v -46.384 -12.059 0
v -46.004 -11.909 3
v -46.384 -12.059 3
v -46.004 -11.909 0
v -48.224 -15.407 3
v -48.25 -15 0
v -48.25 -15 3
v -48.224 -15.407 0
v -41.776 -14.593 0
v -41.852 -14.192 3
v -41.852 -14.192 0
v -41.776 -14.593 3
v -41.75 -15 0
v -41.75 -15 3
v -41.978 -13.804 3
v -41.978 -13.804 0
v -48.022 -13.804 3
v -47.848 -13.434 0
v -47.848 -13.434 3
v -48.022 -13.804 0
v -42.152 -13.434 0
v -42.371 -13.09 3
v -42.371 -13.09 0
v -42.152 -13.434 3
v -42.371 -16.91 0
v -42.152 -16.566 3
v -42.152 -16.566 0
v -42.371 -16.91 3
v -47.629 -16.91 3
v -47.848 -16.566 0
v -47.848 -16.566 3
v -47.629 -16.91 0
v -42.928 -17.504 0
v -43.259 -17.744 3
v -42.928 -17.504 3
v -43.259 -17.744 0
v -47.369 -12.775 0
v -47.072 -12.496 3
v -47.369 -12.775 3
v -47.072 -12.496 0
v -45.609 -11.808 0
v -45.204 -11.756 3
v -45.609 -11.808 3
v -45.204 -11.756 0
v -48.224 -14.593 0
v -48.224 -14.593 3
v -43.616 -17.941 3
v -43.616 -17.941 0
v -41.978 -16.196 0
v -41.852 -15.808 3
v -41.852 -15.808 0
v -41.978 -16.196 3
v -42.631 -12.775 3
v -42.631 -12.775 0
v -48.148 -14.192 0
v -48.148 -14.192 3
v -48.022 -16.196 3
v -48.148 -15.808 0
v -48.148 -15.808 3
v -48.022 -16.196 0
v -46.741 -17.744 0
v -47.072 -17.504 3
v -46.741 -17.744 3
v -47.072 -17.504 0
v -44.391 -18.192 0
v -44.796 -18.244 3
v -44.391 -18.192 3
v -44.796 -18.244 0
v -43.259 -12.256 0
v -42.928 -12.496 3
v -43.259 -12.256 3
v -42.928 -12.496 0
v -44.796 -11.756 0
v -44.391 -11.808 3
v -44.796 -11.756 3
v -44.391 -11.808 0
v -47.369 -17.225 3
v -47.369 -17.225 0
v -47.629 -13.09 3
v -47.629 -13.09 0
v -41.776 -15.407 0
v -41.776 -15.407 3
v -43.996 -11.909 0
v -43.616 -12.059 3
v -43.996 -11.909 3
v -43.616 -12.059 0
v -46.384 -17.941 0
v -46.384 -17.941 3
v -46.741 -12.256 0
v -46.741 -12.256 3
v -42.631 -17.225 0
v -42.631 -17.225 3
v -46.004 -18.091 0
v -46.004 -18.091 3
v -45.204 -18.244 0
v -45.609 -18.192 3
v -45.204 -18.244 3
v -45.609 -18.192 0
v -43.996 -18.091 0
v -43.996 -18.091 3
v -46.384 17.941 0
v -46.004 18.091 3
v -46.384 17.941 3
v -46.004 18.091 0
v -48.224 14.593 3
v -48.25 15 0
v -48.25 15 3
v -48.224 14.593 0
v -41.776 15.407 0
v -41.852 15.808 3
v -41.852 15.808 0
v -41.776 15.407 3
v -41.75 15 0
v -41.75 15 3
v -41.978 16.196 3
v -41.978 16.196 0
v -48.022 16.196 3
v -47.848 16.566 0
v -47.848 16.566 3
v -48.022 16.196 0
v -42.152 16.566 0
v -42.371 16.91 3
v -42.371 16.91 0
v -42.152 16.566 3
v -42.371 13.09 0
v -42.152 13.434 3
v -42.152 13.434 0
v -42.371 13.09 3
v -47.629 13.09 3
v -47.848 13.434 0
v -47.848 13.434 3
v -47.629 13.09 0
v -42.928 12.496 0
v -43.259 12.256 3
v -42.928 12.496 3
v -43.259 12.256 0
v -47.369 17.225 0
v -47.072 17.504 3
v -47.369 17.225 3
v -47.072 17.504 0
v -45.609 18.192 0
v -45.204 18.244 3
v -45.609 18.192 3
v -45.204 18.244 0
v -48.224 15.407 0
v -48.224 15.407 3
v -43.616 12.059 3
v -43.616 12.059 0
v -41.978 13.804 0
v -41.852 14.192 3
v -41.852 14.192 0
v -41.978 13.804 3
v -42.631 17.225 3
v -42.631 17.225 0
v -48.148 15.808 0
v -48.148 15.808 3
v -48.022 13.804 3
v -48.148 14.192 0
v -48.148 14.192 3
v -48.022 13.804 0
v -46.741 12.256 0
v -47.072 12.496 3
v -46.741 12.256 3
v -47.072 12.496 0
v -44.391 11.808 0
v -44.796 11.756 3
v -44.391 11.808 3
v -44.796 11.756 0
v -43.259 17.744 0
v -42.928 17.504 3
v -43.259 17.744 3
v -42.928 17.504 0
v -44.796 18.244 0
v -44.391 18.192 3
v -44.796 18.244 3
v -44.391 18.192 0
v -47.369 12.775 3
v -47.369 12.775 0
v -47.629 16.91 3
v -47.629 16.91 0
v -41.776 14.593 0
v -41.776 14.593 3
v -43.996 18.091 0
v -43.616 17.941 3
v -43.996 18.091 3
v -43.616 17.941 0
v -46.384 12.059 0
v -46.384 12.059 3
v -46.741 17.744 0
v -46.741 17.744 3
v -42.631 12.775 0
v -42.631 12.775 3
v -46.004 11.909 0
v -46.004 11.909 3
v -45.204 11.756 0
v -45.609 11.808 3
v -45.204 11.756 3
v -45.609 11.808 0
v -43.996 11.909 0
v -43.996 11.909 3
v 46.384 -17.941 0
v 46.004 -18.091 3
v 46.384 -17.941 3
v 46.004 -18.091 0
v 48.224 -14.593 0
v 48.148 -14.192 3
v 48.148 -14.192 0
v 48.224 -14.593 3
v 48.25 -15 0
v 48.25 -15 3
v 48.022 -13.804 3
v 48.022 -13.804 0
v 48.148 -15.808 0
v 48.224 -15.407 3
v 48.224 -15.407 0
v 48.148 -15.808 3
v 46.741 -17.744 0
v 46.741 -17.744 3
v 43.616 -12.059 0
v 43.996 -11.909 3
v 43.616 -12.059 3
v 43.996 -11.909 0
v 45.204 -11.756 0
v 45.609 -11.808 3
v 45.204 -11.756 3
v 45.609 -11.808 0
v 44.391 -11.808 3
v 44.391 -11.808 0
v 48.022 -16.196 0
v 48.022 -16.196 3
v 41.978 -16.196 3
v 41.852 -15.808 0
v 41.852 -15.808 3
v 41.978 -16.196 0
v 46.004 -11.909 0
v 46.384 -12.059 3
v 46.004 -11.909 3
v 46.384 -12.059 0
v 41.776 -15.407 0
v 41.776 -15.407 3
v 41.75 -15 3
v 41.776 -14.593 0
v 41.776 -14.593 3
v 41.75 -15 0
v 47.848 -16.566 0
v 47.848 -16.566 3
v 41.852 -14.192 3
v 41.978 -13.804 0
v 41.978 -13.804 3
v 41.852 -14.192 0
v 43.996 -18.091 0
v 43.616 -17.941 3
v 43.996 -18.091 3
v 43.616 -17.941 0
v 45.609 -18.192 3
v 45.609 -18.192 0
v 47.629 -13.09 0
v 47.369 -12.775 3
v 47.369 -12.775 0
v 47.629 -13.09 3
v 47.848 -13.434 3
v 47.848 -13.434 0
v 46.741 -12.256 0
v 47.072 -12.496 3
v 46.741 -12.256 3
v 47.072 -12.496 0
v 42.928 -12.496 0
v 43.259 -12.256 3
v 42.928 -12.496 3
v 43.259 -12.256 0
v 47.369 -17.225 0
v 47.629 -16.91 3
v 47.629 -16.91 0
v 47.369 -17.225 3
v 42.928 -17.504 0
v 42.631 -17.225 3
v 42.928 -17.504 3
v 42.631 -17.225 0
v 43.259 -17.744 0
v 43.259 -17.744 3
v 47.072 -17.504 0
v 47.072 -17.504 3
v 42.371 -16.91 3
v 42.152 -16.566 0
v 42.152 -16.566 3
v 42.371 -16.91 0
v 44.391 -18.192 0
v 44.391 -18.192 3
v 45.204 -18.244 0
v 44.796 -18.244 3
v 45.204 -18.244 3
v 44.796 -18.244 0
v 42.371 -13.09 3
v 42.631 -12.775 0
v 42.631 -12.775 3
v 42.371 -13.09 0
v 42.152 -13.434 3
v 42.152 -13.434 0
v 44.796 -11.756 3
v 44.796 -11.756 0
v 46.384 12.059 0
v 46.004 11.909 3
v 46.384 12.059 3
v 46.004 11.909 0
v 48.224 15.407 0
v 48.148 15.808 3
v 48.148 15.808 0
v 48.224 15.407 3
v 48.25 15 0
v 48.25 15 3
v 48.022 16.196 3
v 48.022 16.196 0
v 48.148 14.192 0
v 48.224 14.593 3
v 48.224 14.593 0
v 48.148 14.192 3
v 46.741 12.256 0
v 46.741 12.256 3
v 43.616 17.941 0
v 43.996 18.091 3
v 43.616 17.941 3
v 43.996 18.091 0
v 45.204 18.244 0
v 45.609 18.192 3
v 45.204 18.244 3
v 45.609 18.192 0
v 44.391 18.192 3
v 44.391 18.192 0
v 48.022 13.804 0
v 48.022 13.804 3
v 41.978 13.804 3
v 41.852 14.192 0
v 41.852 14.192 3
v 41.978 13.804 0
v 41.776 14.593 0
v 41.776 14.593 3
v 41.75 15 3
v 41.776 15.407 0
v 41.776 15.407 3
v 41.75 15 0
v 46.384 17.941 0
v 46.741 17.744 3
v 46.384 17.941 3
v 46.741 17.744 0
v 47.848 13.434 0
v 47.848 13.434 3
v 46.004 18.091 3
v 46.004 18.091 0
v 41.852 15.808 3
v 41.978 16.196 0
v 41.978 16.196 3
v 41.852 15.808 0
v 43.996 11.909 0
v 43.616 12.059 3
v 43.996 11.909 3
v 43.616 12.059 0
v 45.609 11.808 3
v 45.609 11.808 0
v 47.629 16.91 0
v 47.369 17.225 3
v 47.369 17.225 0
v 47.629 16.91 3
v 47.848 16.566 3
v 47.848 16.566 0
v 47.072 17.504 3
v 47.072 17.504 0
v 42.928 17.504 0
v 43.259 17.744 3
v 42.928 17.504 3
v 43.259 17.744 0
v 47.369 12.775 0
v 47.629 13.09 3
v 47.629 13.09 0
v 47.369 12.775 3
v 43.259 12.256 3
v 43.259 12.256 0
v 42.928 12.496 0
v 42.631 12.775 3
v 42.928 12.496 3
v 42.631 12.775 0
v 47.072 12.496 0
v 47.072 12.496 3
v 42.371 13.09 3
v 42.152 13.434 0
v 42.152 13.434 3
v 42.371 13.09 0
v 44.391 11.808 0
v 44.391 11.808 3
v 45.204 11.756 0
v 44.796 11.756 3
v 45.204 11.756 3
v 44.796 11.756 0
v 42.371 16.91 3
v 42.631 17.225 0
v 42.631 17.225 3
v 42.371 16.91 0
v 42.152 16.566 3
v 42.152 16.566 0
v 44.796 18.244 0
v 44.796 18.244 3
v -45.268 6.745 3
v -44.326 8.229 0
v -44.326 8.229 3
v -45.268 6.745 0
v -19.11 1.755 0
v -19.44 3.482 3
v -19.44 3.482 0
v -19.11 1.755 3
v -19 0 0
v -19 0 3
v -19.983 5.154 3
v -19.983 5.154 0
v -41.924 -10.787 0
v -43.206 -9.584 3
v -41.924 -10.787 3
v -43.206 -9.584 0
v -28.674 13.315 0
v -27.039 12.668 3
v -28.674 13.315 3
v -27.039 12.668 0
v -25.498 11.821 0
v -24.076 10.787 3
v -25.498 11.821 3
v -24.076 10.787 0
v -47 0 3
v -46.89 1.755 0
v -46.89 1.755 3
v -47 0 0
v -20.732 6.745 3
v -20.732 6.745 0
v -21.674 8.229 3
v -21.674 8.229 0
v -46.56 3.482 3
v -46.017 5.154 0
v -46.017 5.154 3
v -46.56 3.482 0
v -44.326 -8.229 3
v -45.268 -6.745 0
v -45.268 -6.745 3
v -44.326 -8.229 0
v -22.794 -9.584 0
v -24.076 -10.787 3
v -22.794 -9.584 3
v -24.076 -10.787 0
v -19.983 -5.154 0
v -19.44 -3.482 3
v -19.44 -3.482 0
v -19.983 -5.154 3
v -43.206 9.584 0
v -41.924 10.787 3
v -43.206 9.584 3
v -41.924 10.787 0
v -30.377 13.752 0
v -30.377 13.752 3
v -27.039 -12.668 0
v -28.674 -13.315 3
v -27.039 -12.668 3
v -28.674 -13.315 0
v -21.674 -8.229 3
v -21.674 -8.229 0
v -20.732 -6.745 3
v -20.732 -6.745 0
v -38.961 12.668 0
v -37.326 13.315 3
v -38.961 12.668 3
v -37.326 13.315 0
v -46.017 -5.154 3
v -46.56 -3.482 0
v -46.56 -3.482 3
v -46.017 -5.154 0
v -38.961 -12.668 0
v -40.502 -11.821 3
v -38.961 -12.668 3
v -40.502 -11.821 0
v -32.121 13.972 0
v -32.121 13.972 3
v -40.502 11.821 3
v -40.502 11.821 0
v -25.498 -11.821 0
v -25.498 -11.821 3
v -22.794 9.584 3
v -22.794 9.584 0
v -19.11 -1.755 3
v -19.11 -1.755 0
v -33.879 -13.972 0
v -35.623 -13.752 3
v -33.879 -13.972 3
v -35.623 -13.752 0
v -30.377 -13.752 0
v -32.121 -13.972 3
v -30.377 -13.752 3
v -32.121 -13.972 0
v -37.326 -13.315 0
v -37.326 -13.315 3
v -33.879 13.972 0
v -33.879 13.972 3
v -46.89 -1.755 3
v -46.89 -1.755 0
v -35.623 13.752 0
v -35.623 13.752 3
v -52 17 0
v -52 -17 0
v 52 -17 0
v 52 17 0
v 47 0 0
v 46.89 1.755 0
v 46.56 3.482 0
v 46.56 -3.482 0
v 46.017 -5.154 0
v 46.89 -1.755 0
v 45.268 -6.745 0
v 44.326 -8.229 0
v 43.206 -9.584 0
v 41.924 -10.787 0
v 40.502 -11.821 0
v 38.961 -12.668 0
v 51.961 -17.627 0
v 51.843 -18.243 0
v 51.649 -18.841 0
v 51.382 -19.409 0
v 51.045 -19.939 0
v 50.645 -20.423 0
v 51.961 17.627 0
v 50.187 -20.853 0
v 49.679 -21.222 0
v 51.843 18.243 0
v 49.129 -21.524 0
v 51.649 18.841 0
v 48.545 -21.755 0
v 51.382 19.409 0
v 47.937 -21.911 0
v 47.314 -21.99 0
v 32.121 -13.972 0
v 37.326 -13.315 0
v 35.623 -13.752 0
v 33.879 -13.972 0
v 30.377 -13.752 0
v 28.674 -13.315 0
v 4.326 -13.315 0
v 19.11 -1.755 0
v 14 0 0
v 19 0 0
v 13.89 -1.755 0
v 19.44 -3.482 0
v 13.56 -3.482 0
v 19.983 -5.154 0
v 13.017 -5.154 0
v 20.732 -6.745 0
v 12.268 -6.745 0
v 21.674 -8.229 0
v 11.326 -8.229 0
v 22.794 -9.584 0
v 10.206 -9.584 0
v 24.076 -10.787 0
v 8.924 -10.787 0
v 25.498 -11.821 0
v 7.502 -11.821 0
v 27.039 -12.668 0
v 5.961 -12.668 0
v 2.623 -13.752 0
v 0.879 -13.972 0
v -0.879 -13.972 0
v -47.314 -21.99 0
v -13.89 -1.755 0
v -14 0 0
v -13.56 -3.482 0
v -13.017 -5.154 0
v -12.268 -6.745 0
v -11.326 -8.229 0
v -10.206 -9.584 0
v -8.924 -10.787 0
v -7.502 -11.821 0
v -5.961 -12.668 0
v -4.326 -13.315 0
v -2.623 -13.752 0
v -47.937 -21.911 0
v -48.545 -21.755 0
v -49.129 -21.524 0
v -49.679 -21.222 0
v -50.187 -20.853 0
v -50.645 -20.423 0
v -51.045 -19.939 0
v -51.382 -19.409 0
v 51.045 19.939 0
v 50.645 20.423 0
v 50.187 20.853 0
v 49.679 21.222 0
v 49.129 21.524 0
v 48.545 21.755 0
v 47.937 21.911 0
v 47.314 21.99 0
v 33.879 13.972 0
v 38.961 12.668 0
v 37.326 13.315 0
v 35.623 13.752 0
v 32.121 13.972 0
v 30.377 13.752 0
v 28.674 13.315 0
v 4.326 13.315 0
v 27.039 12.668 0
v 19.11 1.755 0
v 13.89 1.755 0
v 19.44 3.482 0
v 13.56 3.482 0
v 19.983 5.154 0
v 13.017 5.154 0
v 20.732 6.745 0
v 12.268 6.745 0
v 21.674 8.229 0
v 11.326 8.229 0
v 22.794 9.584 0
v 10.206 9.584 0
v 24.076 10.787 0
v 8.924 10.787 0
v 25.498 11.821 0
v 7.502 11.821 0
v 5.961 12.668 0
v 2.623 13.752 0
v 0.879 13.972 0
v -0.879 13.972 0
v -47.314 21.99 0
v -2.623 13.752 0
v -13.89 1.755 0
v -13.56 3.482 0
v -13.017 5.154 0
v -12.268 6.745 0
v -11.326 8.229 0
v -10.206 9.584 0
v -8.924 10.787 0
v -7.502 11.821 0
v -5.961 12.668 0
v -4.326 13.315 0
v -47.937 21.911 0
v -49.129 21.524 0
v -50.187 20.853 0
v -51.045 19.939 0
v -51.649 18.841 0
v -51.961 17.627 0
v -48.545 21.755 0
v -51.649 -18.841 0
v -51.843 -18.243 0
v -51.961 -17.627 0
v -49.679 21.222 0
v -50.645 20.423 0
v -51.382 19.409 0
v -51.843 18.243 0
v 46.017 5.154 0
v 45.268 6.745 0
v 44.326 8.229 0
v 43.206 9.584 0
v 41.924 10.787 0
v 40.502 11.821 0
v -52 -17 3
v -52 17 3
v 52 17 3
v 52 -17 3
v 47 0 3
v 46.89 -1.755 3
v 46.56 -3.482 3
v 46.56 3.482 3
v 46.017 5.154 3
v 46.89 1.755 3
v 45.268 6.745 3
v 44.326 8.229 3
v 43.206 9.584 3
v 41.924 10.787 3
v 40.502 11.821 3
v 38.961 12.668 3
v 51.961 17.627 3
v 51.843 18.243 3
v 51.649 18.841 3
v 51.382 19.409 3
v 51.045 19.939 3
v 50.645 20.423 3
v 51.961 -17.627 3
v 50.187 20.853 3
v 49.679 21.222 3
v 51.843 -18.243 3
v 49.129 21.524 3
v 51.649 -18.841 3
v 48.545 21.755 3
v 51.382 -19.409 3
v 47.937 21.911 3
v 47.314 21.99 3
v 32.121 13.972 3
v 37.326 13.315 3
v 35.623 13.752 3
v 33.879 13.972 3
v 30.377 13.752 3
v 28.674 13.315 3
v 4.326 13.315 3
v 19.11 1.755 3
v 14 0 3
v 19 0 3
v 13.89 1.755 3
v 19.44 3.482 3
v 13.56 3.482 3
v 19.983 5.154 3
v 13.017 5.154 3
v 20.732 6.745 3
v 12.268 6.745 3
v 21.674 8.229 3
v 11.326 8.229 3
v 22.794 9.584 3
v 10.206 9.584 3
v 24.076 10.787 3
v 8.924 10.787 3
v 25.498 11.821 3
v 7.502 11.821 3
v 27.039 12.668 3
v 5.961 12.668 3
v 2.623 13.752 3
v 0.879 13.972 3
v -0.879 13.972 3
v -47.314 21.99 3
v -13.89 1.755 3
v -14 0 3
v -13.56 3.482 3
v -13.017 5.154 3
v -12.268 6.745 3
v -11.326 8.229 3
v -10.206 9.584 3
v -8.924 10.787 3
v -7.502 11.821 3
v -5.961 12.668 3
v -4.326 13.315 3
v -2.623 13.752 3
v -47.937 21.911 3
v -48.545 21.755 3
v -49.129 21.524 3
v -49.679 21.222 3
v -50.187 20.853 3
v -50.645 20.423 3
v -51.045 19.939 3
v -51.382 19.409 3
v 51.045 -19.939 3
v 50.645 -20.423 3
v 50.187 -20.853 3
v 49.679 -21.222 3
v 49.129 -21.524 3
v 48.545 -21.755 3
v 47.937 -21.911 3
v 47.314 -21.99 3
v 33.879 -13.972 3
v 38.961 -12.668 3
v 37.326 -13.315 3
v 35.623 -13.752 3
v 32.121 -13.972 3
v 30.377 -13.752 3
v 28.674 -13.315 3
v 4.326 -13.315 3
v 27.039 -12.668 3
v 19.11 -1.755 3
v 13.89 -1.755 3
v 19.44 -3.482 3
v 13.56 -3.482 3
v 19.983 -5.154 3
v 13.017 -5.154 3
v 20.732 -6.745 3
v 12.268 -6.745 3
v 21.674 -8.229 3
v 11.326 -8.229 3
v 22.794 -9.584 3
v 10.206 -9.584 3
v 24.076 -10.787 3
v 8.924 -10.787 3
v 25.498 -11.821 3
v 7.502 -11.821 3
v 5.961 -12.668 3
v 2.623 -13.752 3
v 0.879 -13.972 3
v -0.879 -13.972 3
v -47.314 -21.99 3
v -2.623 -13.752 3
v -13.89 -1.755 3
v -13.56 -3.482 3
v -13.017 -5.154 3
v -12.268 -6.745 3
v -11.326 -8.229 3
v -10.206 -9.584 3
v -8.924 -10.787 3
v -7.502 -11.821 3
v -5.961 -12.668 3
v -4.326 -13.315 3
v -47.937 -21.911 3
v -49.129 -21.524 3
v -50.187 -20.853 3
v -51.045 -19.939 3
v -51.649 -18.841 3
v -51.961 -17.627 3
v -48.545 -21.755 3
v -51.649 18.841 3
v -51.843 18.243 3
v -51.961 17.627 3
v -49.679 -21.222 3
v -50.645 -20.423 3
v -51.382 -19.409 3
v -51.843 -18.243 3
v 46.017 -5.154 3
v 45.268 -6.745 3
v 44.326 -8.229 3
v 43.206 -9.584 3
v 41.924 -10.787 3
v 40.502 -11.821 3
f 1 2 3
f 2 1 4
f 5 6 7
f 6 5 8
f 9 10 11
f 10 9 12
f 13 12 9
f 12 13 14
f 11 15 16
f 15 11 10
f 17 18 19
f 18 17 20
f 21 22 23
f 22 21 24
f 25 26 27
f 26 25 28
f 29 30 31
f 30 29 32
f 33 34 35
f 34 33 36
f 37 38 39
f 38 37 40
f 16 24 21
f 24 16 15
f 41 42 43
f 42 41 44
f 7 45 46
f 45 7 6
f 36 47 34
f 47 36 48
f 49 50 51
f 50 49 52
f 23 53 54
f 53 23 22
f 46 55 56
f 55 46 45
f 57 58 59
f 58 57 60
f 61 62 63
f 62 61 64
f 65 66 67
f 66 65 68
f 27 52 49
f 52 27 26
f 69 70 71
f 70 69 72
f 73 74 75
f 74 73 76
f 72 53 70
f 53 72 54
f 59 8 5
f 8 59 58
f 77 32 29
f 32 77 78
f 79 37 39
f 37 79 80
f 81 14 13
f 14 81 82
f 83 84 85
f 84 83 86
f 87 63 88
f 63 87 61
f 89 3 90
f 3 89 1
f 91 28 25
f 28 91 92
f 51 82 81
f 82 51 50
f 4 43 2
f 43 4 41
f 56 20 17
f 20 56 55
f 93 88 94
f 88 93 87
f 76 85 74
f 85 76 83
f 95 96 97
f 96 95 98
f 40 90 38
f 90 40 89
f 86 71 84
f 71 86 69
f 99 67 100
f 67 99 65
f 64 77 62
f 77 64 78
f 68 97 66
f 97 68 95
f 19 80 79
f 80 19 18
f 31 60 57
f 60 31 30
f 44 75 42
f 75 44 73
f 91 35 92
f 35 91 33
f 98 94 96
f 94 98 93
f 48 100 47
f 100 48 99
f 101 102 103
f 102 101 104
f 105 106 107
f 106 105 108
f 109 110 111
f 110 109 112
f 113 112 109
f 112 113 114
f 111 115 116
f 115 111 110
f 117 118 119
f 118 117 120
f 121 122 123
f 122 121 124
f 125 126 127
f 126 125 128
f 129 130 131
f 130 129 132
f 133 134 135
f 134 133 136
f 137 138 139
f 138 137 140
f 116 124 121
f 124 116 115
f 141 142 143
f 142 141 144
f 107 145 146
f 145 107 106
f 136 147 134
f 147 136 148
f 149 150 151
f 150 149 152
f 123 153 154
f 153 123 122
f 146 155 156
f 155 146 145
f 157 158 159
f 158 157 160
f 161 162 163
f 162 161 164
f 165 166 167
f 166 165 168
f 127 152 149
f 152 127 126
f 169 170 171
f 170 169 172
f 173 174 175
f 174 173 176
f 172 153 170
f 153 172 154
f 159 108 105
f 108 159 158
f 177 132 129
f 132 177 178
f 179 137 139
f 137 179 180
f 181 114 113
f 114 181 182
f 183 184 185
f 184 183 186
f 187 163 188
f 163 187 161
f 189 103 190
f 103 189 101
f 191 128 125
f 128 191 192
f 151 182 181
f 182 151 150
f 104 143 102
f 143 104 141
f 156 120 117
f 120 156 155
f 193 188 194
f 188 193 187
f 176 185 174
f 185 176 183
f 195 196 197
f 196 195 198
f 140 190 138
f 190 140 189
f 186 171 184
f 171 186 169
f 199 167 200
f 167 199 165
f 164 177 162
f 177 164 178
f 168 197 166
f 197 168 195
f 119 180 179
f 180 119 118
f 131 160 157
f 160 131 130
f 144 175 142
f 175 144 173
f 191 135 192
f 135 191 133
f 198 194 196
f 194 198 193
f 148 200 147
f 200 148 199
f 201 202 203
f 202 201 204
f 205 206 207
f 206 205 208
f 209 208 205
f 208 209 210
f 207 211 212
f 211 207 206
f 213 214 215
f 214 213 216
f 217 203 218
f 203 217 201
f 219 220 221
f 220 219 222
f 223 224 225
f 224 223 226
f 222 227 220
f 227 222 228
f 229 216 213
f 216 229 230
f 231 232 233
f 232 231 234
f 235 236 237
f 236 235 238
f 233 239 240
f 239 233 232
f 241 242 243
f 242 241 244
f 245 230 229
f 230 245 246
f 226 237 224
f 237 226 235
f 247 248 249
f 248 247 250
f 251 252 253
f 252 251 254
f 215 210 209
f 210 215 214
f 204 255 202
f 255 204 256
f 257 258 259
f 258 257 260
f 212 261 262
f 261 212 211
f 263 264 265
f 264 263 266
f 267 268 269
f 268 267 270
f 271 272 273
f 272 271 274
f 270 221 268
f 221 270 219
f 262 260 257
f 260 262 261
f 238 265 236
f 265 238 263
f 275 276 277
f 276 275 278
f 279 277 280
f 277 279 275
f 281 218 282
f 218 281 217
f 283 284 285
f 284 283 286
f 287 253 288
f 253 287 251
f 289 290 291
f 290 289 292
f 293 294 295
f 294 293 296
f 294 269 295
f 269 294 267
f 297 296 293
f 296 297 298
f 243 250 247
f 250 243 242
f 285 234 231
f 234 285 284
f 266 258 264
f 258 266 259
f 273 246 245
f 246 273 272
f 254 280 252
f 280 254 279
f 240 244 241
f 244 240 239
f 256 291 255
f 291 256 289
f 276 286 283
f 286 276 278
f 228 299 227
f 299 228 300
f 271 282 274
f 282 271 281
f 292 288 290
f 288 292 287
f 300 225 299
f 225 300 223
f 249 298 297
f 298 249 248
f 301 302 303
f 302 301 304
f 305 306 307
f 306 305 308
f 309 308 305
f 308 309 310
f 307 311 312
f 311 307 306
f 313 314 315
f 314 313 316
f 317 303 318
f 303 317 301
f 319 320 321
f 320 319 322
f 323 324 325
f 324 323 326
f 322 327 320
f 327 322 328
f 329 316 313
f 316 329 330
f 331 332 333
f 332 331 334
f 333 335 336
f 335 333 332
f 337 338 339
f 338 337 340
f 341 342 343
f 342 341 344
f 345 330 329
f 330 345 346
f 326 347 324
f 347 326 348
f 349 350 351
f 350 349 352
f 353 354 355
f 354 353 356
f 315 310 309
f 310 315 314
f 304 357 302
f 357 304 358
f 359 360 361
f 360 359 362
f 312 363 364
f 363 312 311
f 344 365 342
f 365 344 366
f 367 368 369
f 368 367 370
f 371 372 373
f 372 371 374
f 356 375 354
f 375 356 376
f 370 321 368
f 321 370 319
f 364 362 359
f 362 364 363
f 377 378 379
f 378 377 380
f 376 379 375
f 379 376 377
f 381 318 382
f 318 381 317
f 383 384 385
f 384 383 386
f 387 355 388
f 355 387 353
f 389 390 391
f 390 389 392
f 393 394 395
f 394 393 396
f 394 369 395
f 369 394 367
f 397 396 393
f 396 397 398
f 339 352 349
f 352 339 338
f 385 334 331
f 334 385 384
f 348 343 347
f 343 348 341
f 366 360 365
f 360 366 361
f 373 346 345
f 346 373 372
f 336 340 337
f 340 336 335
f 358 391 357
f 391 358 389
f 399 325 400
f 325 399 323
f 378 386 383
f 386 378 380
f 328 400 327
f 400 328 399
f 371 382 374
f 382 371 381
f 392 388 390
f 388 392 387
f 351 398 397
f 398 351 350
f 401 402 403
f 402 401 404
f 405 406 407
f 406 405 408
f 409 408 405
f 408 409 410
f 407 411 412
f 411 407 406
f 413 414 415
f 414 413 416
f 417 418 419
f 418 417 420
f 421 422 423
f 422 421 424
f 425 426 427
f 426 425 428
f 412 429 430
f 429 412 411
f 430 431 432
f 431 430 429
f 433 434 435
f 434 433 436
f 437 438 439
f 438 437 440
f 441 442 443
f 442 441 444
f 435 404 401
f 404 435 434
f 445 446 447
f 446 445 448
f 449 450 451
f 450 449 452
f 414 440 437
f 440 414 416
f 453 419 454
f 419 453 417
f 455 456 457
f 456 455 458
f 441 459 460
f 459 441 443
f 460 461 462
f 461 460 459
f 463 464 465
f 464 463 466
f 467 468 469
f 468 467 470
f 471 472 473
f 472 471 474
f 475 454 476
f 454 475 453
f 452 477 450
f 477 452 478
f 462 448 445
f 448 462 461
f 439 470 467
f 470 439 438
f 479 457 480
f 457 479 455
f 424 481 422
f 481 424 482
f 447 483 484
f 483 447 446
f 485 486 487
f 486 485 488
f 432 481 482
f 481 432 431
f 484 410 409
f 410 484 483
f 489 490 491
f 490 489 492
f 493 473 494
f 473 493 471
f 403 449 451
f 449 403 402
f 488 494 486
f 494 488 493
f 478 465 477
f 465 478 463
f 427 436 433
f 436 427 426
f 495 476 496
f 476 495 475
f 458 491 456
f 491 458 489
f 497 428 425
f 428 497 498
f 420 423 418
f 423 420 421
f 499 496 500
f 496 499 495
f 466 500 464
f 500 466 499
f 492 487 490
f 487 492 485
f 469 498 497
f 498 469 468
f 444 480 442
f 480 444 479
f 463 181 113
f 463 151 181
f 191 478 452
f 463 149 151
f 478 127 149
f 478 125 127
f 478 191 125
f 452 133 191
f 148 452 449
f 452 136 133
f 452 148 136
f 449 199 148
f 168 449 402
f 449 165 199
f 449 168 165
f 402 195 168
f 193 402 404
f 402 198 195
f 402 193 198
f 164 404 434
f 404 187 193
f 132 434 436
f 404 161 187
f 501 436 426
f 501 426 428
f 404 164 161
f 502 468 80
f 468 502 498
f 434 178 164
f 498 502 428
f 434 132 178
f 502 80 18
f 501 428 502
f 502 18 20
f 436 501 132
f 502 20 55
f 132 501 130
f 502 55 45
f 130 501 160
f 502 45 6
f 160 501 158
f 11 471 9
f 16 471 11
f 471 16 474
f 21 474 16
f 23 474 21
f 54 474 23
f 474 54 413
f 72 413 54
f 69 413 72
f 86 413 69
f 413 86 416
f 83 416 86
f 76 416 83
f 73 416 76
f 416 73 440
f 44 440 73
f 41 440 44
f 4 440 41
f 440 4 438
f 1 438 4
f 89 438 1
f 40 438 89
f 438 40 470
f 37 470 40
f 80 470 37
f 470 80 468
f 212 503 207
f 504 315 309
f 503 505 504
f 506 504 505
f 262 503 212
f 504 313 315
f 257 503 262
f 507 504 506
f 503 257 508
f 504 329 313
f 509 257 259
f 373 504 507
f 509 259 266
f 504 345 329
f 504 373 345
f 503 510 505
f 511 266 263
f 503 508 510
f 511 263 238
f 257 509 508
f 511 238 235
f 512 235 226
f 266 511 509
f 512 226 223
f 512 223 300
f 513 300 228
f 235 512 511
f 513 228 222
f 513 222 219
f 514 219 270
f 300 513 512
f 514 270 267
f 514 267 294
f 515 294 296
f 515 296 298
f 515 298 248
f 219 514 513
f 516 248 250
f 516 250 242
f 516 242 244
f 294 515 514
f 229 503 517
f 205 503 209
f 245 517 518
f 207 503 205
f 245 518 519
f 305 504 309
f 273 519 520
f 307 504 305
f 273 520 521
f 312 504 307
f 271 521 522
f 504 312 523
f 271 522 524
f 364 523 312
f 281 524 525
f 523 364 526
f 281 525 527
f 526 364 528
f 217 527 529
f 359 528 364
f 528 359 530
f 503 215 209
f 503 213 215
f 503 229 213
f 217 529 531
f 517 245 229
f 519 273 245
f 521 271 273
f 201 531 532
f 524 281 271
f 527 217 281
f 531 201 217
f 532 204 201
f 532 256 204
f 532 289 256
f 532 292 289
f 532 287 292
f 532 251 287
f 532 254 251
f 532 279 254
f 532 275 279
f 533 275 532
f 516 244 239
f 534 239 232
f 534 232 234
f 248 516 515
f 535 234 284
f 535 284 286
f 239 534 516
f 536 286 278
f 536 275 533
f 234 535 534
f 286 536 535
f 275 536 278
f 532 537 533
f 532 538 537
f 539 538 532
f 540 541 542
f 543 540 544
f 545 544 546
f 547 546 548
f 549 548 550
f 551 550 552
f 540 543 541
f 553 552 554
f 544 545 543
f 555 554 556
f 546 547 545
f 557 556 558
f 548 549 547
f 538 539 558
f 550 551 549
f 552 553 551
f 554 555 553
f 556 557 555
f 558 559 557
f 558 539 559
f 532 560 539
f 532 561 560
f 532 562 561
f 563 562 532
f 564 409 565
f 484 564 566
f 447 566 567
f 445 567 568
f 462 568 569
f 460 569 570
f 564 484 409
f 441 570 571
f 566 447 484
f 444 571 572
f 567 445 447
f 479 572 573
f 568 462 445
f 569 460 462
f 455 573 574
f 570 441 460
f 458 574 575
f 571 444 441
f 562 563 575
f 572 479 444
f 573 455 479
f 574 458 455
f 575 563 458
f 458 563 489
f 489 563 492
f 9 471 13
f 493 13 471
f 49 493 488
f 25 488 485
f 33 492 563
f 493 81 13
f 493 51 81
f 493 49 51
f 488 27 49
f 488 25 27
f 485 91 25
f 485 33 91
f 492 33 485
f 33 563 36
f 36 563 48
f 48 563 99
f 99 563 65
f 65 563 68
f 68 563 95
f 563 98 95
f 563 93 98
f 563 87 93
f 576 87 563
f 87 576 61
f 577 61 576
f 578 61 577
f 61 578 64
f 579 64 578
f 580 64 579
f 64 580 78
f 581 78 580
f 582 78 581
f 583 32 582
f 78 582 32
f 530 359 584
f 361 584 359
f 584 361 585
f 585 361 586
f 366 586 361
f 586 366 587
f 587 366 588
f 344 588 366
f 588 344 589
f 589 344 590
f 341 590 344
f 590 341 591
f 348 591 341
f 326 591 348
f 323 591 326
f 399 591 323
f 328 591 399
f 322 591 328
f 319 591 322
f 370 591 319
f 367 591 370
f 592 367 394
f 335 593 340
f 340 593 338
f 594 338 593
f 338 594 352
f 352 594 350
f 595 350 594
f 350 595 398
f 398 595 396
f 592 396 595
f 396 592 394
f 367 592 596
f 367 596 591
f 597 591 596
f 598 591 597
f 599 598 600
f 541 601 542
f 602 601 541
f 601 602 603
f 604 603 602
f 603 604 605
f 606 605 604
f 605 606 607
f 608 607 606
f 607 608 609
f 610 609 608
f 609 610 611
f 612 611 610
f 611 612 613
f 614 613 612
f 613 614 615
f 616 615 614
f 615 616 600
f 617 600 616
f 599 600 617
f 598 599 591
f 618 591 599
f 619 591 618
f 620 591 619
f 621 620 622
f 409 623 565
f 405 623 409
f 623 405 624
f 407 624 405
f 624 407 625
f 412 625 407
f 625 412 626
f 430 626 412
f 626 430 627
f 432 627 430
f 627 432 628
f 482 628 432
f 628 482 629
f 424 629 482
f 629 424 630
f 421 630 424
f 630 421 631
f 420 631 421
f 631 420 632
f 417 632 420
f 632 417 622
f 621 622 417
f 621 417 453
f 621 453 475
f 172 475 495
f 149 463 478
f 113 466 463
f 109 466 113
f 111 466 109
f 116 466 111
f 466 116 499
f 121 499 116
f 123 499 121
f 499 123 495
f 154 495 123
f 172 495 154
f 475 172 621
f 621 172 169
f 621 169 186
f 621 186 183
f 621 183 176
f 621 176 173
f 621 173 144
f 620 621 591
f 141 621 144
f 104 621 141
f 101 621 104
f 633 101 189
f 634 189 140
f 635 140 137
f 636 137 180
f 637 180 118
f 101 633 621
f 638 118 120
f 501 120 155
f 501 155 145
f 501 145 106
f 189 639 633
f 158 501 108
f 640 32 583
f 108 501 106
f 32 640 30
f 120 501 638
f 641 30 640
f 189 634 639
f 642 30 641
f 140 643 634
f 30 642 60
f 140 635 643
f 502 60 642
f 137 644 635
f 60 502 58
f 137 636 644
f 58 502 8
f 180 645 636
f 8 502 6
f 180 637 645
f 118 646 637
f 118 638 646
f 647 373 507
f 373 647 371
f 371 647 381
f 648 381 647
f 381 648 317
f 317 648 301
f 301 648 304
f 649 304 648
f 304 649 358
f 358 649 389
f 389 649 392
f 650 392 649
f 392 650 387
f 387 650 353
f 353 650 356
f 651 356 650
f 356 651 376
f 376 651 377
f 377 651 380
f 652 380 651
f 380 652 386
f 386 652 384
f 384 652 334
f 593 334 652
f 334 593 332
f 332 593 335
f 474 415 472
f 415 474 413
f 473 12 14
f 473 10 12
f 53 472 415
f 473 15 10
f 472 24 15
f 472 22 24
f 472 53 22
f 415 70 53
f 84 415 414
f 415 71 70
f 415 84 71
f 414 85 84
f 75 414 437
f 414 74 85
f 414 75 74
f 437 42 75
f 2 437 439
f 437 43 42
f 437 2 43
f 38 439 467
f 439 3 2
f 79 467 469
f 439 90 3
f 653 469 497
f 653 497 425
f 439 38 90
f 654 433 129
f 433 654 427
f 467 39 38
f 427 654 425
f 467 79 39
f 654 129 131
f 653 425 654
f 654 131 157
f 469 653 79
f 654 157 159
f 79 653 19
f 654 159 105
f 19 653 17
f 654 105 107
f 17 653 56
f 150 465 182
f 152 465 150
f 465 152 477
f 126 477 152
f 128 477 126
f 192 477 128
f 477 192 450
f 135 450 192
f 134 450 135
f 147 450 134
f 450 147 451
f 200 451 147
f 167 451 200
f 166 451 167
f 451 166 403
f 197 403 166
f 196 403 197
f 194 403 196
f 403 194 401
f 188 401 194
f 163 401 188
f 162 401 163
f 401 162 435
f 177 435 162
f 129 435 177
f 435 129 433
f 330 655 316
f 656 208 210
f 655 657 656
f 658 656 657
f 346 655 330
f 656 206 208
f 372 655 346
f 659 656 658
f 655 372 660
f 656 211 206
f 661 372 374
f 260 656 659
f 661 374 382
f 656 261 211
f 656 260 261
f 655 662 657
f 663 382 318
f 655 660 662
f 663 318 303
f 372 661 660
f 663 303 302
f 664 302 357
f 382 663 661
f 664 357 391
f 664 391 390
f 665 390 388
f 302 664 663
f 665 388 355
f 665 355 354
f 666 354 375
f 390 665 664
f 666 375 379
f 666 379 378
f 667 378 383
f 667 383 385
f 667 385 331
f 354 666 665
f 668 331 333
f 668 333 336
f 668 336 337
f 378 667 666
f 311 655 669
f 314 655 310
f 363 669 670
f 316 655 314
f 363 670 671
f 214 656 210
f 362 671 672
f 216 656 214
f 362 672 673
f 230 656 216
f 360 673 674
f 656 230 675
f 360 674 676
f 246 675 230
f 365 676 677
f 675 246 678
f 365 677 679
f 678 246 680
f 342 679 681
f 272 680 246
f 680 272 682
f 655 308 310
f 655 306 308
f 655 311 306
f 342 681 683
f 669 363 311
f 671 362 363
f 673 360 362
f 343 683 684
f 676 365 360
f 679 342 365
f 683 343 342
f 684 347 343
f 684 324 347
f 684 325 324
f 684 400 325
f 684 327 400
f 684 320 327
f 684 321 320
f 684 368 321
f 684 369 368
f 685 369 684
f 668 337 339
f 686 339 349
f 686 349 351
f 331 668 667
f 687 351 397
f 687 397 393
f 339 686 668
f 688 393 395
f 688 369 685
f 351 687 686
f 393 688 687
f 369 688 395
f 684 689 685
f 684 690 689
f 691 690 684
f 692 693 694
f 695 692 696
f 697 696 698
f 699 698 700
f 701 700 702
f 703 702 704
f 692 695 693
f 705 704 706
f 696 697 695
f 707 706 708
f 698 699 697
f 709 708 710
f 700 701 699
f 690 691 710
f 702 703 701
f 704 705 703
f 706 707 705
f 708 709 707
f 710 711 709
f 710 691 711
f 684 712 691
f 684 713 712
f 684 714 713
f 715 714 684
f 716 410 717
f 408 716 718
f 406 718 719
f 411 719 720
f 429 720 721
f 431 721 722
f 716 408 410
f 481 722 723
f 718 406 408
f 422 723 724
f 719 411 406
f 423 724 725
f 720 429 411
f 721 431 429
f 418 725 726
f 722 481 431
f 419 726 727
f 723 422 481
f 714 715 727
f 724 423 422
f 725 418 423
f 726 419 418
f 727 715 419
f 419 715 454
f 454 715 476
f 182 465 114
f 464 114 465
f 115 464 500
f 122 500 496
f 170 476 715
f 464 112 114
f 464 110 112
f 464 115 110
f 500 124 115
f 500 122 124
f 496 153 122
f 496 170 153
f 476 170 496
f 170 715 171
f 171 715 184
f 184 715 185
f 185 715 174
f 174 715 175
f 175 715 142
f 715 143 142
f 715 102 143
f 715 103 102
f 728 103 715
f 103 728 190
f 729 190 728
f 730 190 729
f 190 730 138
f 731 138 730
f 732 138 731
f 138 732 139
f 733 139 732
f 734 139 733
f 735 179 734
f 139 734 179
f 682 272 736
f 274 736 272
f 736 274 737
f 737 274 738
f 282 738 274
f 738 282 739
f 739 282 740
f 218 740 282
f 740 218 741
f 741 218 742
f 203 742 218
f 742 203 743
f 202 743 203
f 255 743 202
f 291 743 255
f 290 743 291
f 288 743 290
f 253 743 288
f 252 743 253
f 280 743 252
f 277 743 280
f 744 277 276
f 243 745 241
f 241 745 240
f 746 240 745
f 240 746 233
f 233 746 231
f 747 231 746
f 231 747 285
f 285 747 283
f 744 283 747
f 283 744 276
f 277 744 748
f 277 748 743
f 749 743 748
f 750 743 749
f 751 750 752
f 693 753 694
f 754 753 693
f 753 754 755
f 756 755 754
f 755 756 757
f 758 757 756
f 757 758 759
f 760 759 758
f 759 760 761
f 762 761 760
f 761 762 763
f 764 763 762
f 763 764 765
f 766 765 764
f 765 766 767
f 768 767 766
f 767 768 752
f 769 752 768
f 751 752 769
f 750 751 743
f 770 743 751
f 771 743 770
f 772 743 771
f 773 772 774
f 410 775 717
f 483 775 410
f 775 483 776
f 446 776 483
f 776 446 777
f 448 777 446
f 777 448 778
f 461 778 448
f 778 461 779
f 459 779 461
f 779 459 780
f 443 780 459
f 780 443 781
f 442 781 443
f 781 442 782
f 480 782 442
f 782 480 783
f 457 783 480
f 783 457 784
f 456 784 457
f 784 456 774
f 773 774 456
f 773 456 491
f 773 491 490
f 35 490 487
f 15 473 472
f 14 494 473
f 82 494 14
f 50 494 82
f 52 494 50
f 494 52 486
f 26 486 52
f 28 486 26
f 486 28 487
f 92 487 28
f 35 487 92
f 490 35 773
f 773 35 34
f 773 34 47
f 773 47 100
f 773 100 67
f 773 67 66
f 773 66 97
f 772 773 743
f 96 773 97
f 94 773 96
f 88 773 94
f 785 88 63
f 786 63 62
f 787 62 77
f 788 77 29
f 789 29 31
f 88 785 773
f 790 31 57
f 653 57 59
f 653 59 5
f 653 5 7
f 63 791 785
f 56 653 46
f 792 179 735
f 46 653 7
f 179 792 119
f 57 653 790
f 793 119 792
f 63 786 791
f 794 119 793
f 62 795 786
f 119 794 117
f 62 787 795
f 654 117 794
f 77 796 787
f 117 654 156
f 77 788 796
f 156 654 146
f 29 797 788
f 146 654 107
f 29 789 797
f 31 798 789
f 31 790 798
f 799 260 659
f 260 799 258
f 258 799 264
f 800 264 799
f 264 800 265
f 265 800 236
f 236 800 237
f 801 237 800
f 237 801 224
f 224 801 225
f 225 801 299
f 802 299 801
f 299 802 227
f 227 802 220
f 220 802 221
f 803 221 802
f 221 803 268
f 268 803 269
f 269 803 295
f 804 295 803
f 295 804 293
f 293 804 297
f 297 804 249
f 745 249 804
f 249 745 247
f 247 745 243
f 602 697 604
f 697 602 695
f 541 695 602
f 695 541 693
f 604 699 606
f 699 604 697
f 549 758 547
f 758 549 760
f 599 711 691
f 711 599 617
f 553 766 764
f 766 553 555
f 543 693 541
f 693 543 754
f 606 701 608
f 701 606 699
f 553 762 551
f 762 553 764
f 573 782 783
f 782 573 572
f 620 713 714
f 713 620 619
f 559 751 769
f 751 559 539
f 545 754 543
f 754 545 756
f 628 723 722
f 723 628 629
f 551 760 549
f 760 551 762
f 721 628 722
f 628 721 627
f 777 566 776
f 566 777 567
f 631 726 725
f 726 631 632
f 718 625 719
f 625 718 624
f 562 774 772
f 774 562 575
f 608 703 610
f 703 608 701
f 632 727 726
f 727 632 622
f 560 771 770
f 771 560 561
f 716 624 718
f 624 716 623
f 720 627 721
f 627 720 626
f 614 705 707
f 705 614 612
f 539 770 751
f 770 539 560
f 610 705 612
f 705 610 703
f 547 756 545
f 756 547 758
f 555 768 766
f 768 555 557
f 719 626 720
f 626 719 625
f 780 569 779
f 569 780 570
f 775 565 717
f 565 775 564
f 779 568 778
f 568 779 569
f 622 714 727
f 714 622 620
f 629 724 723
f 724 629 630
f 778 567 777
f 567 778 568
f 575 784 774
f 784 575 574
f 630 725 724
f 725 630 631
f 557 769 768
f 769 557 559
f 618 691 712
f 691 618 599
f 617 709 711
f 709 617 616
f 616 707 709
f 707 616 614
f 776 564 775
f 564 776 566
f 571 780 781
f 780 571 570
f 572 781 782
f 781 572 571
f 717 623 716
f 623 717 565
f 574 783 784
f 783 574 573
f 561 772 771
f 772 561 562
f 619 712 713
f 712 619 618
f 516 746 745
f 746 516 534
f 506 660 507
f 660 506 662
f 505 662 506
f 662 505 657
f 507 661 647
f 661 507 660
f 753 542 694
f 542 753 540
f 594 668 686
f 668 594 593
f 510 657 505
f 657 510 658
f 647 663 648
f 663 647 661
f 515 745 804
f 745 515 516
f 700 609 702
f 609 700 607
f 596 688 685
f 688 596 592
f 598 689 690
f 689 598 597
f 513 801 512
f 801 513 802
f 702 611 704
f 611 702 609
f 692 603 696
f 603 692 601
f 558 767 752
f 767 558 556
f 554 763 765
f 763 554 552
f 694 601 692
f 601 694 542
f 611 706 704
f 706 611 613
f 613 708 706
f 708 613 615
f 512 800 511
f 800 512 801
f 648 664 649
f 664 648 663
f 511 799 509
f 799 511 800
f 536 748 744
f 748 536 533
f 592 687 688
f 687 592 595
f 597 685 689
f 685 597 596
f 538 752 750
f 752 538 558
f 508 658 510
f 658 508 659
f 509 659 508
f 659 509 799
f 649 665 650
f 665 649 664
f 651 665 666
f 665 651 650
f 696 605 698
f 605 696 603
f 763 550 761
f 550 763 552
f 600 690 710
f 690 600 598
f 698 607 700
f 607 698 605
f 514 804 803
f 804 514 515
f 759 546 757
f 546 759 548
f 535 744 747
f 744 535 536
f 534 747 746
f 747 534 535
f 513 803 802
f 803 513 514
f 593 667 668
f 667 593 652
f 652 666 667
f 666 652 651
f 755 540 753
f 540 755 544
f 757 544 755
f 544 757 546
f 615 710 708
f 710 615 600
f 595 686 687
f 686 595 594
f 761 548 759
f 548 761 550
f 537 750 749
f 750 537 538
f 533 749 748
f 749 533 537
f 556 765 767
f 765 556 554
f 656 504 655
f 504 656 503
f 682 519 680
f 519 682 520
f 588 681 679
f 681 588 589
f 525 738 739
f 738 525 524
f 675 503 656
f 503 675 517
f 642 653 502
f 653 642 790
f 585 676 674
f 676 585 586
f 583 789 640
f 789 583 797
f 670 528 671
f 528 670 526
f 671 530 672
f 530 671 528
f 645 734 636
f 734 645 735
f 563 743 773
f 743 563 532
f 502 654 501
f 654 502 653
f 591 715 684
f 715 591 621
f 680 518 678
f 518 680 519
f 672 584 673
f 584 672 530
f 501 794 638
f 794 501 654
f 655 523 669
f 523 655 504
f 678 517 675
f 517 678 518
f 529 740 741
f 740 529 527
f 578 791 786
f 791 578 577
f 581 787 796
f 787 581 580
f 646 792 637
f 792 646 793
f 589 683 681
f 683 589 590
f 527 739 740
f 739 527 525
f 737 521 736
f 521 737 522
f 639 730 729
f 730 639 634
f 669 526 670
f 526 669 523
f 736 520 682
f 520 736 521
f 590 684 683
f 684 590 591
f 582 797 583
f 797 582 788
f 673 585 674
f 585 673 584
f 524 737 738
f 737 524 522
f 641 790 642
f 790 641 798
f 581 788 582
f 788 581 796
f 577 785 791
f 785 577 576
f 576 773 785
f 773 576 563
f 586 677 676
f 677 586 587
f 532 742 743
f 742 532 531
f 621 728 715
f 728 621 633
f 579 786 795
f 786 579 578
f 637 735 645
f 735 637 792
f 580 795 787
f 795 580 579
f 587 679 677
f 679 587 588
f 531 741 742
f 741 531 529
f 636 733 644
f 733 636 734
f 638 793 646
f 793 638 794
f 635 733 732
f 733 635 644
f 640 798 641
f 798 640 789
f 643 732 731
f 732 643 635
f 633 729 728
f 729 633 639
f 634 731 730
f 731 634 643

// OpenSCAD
$fn = 50;

difference() {
	union() {
		hull() {
			translate(v = [-47.0, 17.0, 0]) {
				cylinder(h = 3, r = 5);
			}
			translate(v = [47.0, 17.0, 0]) {
				cylinder(h = 3, r = 5);
			}
			translate(v = [-47.0, -17.0, 0]) {
				cylinder(h = 3, r = 5);
			}
			translate(v = [47.0, -17.0, 0]) {
				cylinder(h = 3, r = 5);
			}
		}
	}
	union() {
		translate(v = [-45.0, -15.0, -100.0]) {
			cylinder(h = 200, r = 3.25);
		}
		translate(v = [-45.0, 15.0, -100.0]) {
			cylinder(h = 200, r = 3.25);
		}
		translate(v = [45.0, -15.0, -100.0]) {
			cylinder(h = 200, r = 3.25);
		}
		translate(v = [45.0, 15.0, -100.0]) {
			cylinder(h = 200, r = 3.25);
		}
		translate(v = [-45.0, -15.0, -100.0]) {
			cylinder(h = 200, r = 1.8);
		}
		translate(v = [-45.0, 15.0, -100.0]) {
			cylinder(h = 200, r = 1.8);
		}
		translate(v = [45.0, -15.0, -100.0]) {
			cylinder(h = 200, r = 1.8);
		}
		translate(v = [45.0, 15.0, -100.0]) {
			cylinder(h = 200, r = 1.8);
		}
		translate(v = [-33.0, 0, 0.0]) {
			cylinder(h = 3, r = 14.0);
		}
		cylinder(h = 3, r = 14.0);
		translate(v = [33.0, 0, 0.0]) {
			cylinder(h = 3, r = 14.0);
		}
	}
}
